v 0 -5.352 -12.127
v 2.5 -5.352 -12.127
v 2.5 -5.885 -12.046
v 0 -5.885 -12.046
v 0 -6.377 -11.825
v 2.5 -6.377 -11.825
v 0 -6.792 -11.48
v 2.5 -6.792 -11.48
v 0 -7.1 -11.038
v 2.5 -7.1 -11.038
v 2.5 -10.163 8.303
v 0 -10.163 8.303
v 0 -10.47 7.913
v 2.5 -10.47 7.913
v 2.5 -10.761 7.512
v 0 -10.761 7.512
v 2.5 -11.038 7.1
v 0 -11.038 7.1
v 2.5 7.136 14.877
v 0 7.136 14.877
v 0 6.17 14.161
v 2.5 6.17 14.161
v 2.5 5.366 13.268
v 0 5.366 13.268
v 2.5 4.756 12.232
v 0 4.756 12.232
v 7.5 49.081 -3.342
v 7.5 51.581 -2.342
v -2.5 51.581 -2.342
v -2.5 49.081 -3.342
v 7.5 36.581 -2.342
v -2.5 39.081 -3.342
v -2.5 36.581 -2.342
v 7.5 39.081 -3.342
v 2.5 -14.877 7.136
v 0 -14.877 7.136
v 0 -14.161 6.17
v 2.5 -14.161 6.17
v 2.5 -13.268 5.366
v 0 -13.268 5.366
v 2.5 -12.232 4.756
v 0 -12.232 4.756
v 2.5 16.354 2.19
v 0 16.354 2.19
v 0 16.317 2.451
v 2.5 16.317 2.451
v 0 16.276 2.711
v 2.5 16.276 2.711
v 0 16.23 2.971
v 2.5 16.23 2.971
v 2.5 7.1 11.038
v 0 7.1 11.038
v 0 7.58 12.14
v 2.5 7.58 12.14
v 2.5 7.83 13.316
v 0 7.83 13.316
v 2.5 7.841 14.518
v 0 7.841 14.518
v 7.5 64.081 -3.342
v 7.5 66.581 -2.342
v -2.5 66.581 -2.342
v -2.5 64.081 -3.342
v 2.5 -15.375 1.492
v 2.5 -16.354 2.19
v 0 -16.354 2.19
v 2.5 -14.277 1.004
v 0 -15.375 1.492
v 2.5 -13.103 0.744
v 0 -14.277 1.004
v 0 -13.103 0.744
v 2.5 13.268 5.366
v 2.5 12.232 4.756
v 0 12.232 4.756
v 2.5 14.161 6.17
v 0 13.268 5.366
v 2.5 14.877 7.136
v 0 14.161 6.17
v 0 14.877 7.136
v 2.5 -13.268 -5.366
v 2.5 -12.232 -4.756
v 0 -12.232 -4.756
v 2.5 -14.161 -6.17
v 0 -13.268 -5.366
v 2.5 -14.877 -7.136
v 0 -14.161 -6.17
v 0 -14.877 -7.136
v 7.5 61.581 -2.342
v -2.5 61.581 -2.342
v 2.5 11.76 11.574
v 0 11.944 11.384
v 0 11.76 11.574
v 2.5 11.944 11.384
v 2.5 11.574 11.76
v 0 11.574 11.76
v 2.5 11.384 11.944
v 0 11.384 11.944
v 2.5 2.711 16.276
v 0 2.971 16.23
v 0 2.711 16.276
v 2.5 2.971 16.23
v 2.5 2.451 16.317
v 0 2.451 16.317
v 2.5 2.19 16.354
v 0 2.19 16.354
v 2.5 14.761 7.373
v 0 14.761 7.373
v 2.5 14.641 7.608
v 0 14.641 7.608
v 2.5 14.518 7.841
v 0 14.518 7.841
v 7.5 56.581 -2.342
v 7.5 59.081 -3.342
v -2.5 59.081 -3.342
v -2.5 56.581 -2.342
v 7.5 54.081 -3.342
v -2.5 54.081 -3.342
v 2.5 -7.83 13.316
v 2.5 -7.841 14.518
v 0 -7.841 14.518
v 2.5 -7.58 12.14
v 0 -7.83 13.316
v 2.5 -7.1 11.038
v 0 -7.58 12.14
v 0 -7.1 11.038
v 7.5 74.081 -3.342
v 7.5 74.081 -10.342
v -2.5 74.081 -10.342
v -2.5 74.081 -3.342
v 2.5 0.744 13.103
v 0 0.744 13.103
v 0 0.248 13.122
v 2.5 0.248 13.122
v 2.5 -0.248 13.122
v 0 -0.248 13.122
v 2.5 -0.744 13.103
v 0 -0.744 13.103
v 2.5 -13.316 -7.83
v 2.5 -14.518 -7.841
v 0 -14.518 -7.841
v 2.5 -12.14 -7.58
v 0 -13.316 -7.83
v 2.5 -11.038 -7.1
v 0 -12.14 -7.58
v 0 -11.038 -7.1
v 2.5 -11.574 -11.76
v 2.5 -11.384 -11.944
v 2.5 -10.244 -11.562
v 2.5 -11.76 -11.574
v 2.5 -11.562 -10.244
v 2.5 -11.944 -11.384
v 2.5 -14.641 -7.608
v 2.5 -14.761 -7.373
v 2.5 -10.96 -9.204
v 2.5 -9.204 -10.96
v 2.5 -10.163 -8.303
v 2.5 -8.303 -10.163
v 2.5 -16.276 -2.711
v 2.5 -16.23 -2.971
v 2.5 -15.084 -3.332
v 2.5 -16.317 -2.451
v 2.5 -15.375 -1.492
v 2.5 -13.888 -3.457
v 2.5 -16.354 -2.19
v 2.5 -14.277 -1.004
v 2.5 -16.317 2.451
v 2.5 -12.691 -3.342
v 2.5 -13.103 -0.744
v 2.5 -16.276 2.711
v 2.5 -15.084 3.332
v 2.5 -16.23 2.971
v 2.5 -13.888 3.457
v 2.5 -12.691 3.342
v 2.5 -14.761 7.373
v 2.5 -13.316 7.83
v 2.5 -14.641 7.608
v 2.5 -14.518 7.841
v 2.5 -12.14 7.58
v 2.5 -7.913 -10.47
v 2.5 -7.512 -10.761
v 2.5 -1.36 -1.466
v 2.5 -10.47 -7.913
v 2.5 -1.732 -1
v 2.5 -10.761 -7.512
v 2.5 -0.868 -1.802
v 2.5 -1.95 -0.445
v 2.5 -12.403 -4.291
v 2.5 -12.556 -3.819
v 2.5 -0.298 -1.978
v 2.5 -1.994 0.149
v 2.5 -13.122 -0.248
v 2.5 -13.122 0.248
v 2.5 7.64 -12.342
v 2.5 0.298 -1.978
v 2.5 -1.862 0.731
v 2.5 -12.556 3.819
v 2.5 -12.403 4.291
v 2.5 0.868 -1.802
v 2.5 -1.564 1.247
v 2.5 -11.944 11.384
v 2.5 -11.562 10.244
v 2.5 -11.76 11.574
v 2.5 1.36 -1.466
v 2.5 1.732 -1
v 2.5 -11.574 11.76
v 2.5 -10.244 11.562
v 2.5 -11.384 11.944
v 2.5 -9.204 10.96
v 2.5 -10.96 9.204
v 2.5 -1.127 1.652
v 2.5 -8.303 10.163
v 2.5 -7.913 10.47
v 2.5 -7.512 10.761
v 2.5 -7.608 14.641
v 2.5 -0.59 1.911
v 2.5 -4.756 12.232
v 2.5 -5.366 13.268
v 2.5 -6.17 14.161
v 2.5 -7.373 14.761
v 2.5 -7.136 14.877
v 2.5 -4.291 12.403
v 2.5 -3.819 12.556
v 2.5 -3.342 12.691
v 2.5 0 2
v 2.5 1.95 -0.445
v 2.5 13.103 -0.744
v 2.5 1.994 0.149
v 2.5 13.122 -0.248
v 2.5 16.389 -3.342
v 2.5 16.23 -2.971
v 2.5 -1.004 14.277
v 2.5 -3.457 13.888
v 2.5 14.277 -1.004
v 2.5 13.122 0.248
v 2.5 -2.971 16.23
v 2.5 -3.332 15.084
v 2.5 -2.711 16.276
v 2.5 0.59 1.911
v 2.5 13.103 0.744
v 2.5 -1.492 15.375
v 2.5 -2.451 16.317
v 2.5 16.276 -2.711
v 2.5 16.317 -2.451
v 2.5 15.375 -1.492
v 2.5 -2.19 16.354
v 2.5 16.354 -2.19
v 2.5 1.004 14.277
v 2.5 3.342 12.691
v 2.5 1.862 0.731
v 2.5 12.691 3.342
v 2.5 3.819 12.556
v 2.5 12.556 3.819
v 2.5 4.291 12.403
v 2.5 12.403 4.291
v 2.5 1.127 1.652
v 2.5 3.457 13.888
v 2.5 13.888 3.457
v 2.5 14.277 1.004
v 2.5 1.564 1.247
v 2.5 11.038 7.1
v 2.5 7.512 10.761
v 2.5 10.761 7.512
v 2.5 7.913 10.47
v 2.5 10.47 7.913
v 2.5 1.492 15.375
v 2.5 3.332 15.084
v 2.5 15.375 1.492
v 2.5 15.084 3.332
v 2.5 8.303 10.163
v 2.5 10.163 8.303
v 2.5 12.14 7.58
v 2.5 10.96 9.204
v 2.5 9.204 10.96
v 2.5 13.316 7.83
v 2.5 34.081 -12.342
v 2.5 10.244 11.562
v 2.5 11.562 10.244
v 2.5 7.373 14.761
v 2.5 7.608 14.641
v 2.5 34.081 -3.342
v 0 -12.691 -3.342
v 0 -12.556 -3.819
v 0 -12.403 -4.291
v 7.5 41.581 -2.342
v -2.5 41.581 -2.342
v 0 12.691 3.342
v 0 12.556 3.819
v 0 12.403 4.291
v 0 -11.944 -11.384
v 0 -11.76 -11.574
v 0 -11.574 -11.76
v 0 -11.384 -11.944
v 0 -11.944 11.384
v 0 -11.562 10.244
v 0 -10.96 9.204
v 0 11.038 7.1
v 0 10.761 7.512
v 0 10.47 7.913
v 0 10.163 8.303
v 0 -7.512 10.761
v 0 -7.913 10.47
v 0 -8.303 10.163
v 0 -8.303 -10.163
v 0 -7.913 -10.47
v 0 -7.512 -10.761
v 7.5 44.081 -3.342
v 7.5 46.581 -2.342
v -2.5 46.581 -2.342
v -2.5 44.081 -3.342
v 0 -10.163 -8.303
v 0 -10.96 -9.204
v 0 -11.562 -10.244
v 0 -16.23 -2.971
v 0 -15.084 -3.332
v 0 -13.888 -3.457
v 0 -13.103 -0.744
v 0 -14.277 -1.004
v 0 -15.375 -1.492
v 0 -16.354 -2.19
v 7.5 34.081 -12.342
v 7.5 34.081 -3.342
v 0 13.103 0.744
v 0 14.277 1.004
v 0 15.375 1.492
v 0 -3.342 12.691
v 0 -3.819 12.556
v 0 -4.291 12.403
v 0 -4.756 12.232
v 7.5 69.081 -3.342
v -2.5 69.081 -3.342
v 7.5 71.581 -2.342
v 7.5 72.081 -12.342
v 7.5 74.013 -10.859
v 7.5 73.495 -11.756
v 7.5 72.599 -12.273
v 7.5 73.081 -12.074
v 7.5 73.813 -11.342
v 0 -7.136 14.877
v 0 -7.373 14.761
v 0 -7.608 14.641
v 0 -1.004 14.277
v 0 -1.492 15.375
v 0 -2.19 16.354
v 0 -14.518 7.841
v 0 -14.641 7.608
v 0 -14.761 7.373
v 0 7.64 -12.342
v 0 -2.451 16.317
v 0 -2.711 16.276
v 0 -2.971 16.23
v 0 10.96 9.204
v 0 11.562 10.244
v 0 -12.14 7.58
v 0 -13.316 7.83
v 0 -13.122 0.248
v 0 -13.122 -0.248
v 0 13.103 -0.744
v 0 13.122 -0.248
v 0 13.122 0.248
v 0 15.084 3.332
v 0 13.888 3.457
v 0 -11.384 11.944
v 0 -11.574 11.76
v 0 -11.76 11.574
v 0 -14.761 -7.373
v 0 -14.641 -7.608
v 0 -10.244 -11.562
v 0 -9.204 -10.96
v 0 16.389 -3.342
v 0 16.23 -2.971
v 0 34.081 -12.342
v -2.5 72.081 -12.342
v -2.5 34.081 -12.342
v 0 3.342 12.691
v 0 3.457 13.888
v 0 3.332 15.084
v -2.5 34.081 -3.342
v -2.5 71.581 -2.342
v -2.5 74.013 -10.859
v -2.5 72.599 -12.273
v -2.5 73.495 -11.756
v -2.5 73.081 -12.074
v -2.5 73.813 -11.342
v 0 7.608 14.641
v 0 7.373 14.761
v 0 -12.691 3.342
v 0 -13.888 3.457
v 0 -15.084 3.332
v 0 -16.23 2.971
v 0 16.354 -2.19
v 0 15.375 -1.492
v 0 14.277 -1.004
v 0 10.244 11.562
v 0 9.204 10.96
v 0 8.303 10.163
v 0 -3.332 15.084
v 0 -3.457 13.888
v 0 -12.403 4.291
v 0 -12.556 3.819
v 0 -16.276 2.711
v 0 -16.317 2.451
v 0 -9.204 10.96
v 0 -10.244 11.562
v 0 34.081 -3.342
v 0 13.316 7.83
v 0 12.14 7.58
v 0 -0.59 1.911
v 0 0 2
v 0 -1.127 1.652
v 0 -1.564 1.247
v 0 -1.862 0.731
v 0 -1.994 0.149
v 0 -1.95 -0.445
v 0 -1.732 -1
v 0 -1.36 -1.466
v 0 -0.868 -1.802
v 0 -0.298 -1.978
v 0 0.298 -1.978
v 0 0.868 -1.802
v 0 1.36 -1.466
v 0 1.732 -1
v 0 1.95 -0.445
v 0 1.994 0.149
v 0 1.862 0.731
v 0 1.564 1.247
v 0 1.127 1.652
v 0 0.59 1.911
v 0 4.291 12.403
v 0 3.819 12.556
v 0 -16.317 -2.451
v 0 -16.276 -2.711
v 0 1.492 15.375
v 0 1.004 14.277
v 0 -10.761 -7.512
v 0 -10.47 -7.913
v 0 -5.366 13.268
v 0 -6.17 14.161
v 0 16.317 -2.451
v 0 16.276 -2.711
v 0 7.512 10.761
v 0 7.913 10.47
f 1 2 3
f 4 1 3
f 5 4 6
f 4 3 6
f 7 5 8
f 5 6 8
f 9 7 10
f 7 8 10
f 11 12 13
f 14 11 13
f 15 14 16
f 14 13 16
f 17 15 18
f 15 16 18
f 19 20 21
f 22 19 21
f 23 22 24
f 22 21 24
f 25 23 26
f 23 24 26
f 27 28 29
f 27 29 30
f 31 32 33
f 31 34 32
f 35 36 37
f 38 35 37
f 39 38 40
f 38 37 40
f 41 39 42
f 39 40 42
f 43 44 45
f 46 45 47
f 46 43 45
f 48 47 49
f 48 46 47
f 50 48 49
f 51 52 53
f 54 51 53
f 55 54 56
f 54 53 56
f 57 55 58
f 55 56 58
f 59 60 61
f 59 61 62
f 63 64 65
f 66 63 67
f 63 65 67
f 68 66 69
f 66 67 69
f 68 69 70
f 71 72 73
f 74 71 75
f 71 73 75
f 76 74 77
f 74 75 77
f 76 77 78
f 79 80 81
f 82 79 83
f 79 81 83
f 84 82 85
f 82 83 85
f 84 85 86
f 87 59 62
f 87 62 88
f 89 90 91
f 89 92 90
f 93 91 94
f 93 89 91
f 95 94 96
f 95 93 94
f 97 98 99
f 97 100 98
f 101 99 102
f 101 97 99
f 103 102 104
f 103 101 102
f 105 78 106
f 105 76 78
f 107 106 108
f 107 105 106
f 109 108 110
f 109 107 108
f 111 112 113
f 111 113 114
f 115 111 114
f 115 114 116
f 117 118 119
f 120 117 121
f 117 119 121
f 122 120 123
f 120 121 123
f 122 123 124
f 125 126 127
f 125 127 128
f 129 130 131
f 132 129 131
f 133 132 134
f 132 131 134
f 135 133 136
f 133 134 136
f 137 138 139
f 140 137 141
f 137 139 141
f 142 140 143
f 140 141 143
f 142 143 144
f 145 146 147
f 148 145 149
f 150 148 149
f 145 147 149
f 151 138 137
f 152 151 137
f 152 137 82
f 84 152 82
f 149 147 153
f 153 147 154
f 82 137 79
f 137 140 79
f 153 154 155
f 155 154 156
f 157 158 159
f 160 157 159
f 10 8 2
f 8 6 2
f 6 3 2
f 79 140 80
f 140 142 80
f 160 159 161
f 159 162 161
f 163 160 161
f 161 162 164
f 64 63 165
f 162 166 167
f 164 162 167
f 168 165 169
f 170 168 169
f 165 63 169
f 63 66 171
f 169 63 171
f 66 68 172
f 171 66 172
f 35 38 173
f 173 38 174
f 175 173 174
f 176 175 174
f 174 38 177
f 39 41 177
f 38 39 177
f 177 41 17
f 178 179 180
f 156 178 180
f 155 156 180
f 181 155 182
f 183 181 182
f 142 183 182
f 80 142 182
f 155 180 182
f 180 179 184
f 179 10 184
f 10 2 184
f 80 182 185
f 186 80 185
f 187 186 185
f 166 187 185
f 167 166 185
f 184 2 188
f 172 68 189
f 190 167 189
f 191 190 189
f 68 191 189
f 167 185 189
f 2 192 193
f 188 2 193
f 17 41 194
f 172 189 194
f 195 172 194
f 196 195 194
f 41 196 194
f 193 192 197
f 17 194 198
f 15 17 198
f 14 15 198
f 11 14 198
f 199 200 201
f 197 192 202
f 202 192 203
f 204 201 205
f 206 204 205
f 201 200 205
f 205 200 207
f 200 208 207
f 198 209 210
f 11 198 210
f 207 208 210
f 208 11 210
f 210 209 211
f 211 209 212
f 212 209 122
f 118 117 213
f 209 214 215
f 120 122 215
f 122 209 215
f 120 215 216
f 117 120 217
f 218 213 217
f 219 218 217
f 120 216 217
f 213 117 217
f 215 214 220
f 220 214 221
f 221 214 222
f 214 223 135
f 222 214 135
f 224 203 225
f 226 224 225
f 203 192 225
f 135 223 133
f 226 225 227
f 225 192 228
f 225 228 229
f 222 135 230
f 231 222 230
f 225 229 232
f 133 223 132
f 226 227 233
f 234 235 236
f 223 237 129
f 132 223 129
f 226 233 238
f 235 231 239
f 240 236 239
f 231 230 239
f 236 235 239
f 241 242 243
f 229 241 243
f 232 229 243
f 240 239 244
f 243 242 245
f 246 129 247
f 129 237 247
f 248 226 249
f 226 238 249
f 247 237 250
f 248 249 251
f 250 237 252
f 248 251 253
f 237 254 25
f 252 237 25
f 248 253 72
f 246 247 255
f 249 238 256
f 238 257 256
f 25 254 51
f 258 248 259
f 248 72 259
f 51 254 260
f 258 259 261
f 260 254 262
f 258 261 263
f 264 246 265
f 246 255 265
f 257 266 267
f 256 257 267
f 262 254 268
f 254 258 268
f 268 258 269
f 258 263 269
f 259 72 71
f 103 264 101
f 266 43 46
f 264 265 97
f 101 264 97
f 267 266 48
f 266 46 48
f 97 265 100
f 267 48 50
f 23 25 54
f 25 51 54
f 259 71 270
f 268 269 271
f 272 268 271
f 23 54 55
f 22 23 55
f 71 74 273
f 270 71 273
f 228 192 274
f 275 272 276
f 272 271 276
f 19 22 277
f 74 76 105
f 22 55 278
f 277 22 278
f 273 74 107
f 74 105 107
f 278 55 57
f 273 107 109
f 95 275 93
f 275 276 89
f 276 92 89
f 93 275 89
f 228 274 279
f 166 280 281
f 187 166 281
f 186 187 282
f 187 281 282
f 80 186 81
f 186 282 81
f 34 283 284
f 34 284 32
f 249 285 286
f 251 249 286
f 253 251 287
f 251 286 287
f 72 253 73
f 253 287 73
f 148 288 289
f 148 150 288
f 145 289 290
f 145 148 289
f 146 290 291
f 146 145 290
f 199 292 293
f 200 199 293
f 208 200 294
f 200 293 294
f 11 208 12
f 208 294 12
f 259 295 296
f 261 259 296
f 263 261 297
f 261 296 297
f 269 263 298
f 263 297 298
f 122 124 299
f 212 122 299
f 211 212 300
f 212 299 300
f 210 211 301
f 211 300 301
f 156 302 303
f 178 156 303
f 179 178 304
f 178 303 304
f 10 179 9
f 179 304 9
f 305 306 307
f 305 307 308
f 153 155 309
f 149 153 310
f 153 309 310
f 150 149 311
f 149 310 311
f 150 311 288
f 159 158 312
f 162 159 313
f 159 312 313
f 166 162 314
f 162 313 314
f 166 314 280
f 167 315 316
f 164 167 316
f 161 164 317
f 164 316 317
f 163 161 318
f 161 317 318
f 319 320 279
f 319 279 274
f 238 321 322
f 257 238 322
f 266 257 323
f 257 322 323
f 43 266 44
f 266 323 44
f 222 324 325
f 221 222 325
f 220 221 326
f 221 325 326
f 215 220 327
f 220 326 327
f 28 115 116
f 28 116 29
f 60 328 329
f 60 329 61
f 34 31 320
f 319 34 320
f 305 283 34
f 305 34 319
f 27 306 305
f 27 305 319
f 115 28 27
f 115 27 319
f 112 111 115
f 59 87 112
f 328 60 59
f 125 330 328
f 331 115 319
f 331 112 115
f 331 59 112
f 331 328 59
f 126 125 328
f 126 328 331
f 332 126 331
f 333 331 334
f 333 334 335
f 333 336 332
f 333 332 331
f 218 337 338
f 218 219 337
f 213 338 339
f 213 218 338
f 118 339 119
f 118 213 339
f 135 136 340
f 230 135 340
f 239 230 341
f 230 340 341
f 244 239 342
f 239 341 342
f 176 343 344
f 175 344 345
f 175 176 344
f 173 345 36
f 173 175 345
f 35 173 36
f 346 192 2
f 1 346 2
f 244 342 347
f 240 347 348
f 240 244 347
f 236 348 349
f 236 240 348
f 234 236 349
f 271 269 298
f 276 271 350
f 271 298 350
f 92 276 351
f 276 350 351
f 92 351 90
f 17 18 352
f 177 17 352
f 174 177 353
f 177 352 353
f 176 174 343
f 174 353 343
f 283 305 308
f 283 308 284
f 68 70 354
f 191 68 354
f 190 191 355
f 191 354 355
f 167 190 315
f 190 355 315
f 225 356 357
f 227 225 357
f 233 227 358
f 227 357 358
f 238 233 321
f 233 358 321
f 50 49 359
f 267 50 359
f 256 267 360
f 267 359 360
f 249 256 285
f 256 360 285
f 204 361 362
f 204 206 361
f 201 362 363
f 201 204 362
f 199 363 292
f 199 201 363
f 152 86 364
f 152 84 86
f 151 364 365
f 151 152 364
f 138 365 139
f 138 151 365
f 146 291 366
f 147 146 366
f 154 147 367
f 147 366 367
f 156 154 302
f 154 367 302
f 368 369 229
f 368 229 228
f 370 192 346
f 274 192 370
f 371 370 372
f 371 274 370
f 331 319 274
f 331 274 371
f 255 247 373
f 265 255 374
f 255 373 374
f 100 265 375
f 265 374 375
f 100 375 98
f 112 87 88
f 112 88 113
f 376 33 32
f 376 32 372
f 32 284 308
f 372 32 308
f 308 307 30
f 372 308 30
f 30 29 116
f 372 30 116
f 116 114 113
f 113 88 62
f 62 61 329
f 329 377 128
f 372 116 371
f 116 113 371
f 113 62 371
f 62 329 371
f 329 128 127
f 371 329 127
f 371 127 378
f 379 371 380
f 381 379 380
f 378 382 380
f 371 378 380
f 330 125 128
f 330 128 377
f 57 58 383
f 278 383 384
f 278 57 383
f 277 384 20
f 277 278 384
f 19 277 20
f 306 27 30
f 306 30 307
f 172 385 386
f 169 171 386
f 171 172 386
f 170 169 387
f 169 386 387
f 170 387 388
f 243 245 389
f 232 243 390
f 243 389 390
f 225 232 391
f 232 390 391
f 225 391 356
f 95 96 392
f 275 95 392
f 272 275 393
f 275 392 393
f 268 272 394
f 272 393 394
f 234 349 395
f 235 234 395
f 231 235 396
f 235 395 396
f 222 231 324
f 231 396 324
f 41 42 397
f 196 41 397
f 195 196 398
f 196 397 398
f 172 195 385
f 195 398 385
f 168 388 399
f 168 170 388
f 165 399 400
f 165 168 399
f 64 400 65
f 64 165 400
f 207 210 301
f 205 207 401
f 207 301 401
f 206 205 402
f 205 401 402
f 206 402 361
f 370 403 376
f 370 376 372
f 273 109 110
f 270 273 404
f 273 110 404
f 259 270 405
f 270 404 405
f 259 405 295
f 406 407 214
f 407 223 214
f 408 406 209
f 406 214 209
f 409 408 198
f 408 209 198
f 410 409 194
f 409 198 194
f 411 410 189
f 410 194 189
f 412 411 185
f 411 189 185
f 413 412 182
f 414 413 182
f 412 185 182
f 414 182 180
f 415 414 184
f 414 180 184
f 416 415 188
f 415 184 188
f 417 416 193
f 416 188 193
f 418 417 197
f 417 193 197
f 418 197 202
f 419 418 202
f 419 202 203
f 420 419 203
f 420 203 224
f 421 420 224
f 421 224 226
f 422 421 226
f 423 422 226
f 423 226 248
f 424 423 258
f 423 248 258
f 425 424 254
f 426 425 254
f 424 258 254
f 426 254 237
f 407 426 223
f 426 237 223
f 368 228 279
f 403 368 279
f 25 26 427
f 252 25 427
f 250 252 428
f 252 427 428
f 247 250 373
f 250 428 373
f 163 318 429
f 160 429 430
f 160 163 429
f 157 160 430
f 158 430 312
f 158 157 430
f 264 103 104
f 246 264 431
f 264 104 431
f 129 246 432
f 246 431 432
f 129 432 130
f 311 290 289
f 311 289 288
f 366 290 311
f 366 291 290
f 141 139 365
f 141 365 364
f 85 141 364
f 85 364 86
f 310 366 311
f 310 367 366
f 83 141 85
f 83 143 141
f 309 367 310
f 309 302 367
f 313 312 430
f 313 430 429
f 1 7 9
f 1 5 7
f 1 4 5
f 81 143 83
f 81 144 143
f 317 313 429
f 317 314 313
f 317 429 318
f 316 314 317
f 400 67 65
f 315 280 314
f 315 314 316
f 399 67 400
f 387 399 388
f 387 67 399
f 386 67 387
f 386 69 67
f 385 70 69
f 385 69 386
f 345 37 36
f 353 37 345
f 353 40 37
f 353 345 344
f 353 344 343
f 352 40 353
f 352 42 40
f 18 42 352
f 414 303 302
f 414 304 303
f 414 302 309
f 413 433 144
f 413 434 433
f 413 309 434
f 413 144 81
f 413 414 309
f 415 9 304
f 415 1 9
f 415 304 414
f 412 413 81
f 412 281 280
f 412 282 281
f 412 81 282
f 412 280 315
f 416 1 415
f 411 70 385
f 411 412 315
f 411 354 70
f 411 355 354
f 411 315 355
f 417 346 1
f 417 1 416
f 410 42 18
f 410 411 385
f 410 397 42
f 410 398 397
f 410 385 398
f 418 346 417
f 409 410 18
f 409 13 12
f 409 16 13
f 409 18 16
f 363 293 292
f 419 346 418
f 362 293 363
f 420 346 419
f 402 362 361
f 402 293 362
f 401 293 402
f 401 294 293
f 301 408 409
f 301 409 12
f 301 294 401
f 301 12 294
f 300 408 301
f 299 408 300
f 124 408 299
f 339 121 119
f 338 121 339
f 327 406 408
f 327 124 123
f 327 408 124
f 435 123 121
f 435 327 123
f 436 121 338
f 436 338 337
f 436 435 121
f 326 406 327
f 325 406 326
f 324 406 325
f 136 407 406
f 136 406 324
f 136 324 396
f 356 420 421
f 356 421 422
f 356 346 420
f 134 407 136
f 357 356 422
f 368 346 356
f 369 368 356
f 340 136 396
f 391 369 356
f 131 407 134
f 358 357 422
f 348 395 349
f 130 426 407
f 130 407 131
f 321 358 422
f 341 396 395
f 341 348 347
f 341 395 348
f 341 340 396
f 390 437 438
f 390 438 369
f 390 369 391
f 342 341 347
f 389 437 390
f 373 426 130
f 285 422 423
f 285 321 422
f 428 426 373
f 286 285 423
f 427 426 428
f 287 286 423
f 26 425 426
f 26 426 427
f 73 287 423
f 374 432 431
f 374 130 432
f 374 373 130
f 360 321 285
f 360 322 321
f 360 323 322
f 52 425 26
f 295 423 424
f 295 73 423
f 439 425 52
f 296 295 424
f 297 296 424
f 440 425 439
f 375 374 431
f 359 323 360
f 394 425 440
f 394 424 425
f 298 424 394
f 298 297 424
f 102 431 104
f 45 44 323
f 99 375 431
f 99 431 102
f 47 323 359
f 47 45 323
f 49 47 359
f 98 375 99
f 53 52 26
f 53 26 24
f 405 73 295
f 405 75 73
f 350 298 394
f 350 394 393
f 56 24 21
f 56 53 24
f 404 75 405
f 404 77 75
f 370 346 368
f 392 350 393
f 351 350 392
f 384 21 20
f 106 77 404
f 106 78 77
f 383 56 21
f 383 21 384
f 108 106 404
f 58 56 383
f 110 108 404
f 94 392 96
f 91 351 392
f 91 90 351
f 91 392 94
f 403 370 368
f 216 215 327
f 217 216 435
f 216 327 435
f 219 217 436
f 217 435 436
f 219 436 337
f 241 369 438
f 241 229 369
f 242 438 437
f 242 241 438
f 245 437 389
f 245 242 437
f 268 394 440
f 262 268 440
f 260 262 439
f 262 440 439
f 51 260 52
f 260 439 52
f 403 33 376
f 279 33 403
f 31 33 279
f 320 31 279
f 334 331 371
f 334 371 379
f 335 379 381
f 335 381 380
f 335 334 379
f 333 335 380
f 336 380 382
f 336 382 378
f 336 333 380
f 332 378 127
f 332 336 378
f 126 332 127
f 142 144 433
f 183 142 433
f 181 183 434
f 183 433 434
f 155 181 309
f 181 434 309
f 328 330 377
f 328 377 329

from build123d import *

# Parameters (mm, degrees)
BASPROSKE_W         = 2.5
BASPROSKE_H         = 16.5
TOOTHCUT_DEPTH      = 24.468063405
TEETHCUTS_COUNT     = 20
TEETHCUTS_ANGLE     = 342
BORSKE_R            = 2
BORE_DEPTH          = 50.0000508
SKETCH1_W           = 9
SKETCH1_H           = 70
BOSS_EXTRUDE2_DEPTH = 2.5
BOSS_EXTRUDE3_DEPTH = 2.5
LPATTERN2_COUNT     = 8
LPATTERN2_PITCH     = 5
CUT_EXTRUDE1_DEPTH  = 3
FILLET3_R           = 2
FILLET4_R           = 2
BOSS_EXTRUDE4_START = -2.5
BOSS_EXTRUDE4_DEPTH = 2.5
BOSS_EXTRUDE5_DEPTH = 5


with BuildPart() as part:
    # BasProSke → Base-Revolve (revolve)
    with BuildSketch(Plane(origin=(0, 0, 0), x_dir=(1, 0, 0), z_dir=(0, 1, 0)), mode=Mode.PRIVATE) as base_revolve_sk:
        with Locations((1.25, 8.25)):
            Rectangle(BASPROSKE_W, BASPROSKE_H)
    revolve(base_revolve_sk.sketch.rotate(Axis((-10, 0, 0), (1, 0, 0)), 180), axis=Axis((-10, 0, 0), (1, 0, 0)))

    # TooCutSke → ToothCut (cut, through all)
    with BuildSketch(Plane(origin=(0, 0, 0), x_dir=(0, 0, -1), z_dir=(1, 0, 0))):
        with BuildLine():
            ThreePointArc((0.74381438, 13.102904875), (0, 13.124), (-0.74381438, 13.102904875))
            ThreePointArc((-0.74381438, 13.102904875), (-1.226473103, 14.852072512), (-2.209965745, 16.376962373))
            ThreePointArc((-2.209965745, 16.376962373), (0, 16.5254), (2.209965745, 16.376962373))
            ThreePointArc((2.209965745, 16.376962373), (1.226473103, 14.852072512), (0.74381438, 13.102904875))
        make_face()
    toothcut = extrude(amount=TOOTHCUT_DEPTH, mode=Mode.SUBTRACT)

    # TeethCuts: ToothCut ×20 about axis
    teethcuts_axis = Axis((-10, 0, 0), (1, 0, 0))
    for i in range(1, TEETHCUTS_COUNT):
        add(toothcut.rotate(teethcuts_axis, i * TEETHCUTS_ANGLE / (TEETHCUTS_COUNT - 1)), mode=Mode.SUBTRACT)

    # BorSke → Bore (cut, symmetric)
    with BuildSketch(Plane(origin=(0, 0, 0), x_dir=(0, 0, -1), z_dir=(1, 0, 0))):
        with Locations(Location((0, 0, 0), (0, 0, 180))):
            Circle(BORSKE_R)
    extrude(amount=BORE_DEPTH, both=True, mode=Mode.SUBTRACT)

    # Sketch1 → Boss-Extrude2 (add)
    with BuildSketch(Plane(origin=(2.5, 0, 0), x_dir=(0, 0, -1), z_dir=(1, 0, 0))):
        with Locations((7.841610769, 39.08106639)):
            Rectangle(SKETCH1_W, SKETCH1_H)
    extrude(amount=-BOSS_EXTRUDE2_DEPTH)

    # Sketch2 → Boss-Extrude3 (add)
    with BuildSketch(Plane(origin=(2.5, 0, 0), x_dir=(0, 0, -1), z_dir=(1, 0, 0))):
        Polygon((2.341610769, 71.58106639), (3.341610769, 69.08106639), (3.341610769, 74.08106639), align=None)
    boss_extrude3 = extrude(amount=-BOSS_EXTRUDE3_DEPTH)

    # LPattern2: Boss-Extrude3 ×8
    with Locations(*[(0, -i * LPATTERN2_PITCH, 0) for i in range(1, LPATTERN2_COUNT)]):
        add(boss_extrude3)

    # Sketch3 → Cut-Extrude1 (cut)
    with BuildSketch(Plane(origin=(2.5, 0, 0), x_dir=(0, 0, -1), z_dir=(1, 0, 0))):
        Polygon((12.341610769, 7.640465379), (11.943579641, -16.474016898), (28.120591599, -19.002507116), (23.794346737, 10.948418847), align=None)
    extrude(amount=-CUT_EXTRUDE1_DEPTH, mode=Mode.SUBTRACT)

    # Fillet3
    # the kernel refuses this fillet: 2 mm, written as the material it takes off along each edge
    with BuildSketch(Plane(origin=(8.029722145, -7.563673717, -12.090652836), x_dir=(0, 0.40305029289493355, 0.9151778304773931), z_dir=(-1, 0, 0))) as fillet3_piece_1:
        with BuildLine():
            CenterArc((2.701383145, 1.26292574), FILLET3_R, 157.176626249, 61.981506818)
            Line((0.857973168, 2.038708994), (0.821104969, 2.054224659))
            Line((0.821104969, 2.054224659), (-0.0368682, 0.015515665))
            Line((-0.0368682, 0.015515665), (-0.003835236, -0.039815713))
            ThreePointArc((-0.003835236, -0.039815713), (0.575285457, -0.067643125), (1.119554669, -0.025258515))
            Line((1.119554669, -0.025258515), (1.150570914, 0))
        make_face()
    extrude(amount=13.55944429, mode=Mode.SUBTRACT)

    # Fillet4
    fillet4_edges = [part.edges().sort_by_distance(p)[0] for p in [
        (1.25, 74.08106639, -12.341610769),
    ]]
    fillet(fillet4_edges, radius=FILLET4_R)

    # Sketch5 → Boss-Extrude4 (add)
    with BuildSketch(Plane(origin=(2.5, 0, 0), x_dir=(0, 0, -1), z_dir=(1, 0, 0)).offset(BOSS_EXTRUDE4_START)):
        with BuildLine():
            ThreePointArc((3.341610769, 15.036857875), (3.187495997, 15.643253498), (2.971070911, 16.230303067))
            Line((2.971070911, 16.230303067), (3.341610769, 16.389315184))
            Line((3.341610769, 16.389315184), (3.341610769, 15.036857875))
        make_face()
    extrude(amount=BOSS_EXTRUDE4_DEPTH)

    # Sketch6 → Boss-Extrude5 (add, symmetric)
    with BuildSketch(Plane(origin=(2.5, 0, 0), x_dir=(0, 0, -1), z_dir=(1, 0, 0))):
        with BuildLine():
            Line((3.341610769, 34.08106639), (12.341610769, 34.08106639))
            Line((12.341610769, 34.08106639), (12.341610769, 72.08106639))
            ThreePointArc((12.341610769, 72.08106639), (11.755824331, 73.495279952), (10.341610769, 74.08106639))
            Line((10.341610769, 74.08106639), (3.341610769, 74.08106639))
            Line((3.341610769, 74.08106639), (2.341610769, 71.58106639))
            Line((2.341610769, 71.58106639), (3.341610769, 69.08106639))
            Line((3.341610769, 69.08106639), (2.341610769, 66.58106639))
            Line((2.341610769, 66.58106639), (3.341610769, 64.08106639))
            Line((3.341610769, 64.08106639), (2.341610769, 61.58106639))
            Line((2.341610769, 61.58106639), (3.341610769, 59.08106639))
            Line((3.341610769, 59.08106639), (2.341610769, 56.58106639))
            Line((2.341610769, 56.58106639), (3.341610769, 54.08106639))
            Line((3.341610769, 54.08106639), (2.341610769, 51.58106639))
            Line((2.341610769, 51.58106639), (3.341610769, 49.08106639))
            Line((3.341610769, 49.08106639), (2.341610769, 46.58106639))
            Line((2.341610769, 46.58106639), (3.341610769, 44.08106639))
            Line((3.341610769, 44.08106639), (2.341610769, 41.58106639))
            Line((2.341610769, 41.58106639), (3.341610769, 39.08106639))
            Line((3.341610769, 39.08106639), (2.341610769, 36.58106639))
            Line((2.341610769, 36.58106639), (3.341610769, 34.08106639))
        make_face()
    extrude(amount=BOSS_EXTRUDE5_DEPTH, both=True)


solid = part.part
